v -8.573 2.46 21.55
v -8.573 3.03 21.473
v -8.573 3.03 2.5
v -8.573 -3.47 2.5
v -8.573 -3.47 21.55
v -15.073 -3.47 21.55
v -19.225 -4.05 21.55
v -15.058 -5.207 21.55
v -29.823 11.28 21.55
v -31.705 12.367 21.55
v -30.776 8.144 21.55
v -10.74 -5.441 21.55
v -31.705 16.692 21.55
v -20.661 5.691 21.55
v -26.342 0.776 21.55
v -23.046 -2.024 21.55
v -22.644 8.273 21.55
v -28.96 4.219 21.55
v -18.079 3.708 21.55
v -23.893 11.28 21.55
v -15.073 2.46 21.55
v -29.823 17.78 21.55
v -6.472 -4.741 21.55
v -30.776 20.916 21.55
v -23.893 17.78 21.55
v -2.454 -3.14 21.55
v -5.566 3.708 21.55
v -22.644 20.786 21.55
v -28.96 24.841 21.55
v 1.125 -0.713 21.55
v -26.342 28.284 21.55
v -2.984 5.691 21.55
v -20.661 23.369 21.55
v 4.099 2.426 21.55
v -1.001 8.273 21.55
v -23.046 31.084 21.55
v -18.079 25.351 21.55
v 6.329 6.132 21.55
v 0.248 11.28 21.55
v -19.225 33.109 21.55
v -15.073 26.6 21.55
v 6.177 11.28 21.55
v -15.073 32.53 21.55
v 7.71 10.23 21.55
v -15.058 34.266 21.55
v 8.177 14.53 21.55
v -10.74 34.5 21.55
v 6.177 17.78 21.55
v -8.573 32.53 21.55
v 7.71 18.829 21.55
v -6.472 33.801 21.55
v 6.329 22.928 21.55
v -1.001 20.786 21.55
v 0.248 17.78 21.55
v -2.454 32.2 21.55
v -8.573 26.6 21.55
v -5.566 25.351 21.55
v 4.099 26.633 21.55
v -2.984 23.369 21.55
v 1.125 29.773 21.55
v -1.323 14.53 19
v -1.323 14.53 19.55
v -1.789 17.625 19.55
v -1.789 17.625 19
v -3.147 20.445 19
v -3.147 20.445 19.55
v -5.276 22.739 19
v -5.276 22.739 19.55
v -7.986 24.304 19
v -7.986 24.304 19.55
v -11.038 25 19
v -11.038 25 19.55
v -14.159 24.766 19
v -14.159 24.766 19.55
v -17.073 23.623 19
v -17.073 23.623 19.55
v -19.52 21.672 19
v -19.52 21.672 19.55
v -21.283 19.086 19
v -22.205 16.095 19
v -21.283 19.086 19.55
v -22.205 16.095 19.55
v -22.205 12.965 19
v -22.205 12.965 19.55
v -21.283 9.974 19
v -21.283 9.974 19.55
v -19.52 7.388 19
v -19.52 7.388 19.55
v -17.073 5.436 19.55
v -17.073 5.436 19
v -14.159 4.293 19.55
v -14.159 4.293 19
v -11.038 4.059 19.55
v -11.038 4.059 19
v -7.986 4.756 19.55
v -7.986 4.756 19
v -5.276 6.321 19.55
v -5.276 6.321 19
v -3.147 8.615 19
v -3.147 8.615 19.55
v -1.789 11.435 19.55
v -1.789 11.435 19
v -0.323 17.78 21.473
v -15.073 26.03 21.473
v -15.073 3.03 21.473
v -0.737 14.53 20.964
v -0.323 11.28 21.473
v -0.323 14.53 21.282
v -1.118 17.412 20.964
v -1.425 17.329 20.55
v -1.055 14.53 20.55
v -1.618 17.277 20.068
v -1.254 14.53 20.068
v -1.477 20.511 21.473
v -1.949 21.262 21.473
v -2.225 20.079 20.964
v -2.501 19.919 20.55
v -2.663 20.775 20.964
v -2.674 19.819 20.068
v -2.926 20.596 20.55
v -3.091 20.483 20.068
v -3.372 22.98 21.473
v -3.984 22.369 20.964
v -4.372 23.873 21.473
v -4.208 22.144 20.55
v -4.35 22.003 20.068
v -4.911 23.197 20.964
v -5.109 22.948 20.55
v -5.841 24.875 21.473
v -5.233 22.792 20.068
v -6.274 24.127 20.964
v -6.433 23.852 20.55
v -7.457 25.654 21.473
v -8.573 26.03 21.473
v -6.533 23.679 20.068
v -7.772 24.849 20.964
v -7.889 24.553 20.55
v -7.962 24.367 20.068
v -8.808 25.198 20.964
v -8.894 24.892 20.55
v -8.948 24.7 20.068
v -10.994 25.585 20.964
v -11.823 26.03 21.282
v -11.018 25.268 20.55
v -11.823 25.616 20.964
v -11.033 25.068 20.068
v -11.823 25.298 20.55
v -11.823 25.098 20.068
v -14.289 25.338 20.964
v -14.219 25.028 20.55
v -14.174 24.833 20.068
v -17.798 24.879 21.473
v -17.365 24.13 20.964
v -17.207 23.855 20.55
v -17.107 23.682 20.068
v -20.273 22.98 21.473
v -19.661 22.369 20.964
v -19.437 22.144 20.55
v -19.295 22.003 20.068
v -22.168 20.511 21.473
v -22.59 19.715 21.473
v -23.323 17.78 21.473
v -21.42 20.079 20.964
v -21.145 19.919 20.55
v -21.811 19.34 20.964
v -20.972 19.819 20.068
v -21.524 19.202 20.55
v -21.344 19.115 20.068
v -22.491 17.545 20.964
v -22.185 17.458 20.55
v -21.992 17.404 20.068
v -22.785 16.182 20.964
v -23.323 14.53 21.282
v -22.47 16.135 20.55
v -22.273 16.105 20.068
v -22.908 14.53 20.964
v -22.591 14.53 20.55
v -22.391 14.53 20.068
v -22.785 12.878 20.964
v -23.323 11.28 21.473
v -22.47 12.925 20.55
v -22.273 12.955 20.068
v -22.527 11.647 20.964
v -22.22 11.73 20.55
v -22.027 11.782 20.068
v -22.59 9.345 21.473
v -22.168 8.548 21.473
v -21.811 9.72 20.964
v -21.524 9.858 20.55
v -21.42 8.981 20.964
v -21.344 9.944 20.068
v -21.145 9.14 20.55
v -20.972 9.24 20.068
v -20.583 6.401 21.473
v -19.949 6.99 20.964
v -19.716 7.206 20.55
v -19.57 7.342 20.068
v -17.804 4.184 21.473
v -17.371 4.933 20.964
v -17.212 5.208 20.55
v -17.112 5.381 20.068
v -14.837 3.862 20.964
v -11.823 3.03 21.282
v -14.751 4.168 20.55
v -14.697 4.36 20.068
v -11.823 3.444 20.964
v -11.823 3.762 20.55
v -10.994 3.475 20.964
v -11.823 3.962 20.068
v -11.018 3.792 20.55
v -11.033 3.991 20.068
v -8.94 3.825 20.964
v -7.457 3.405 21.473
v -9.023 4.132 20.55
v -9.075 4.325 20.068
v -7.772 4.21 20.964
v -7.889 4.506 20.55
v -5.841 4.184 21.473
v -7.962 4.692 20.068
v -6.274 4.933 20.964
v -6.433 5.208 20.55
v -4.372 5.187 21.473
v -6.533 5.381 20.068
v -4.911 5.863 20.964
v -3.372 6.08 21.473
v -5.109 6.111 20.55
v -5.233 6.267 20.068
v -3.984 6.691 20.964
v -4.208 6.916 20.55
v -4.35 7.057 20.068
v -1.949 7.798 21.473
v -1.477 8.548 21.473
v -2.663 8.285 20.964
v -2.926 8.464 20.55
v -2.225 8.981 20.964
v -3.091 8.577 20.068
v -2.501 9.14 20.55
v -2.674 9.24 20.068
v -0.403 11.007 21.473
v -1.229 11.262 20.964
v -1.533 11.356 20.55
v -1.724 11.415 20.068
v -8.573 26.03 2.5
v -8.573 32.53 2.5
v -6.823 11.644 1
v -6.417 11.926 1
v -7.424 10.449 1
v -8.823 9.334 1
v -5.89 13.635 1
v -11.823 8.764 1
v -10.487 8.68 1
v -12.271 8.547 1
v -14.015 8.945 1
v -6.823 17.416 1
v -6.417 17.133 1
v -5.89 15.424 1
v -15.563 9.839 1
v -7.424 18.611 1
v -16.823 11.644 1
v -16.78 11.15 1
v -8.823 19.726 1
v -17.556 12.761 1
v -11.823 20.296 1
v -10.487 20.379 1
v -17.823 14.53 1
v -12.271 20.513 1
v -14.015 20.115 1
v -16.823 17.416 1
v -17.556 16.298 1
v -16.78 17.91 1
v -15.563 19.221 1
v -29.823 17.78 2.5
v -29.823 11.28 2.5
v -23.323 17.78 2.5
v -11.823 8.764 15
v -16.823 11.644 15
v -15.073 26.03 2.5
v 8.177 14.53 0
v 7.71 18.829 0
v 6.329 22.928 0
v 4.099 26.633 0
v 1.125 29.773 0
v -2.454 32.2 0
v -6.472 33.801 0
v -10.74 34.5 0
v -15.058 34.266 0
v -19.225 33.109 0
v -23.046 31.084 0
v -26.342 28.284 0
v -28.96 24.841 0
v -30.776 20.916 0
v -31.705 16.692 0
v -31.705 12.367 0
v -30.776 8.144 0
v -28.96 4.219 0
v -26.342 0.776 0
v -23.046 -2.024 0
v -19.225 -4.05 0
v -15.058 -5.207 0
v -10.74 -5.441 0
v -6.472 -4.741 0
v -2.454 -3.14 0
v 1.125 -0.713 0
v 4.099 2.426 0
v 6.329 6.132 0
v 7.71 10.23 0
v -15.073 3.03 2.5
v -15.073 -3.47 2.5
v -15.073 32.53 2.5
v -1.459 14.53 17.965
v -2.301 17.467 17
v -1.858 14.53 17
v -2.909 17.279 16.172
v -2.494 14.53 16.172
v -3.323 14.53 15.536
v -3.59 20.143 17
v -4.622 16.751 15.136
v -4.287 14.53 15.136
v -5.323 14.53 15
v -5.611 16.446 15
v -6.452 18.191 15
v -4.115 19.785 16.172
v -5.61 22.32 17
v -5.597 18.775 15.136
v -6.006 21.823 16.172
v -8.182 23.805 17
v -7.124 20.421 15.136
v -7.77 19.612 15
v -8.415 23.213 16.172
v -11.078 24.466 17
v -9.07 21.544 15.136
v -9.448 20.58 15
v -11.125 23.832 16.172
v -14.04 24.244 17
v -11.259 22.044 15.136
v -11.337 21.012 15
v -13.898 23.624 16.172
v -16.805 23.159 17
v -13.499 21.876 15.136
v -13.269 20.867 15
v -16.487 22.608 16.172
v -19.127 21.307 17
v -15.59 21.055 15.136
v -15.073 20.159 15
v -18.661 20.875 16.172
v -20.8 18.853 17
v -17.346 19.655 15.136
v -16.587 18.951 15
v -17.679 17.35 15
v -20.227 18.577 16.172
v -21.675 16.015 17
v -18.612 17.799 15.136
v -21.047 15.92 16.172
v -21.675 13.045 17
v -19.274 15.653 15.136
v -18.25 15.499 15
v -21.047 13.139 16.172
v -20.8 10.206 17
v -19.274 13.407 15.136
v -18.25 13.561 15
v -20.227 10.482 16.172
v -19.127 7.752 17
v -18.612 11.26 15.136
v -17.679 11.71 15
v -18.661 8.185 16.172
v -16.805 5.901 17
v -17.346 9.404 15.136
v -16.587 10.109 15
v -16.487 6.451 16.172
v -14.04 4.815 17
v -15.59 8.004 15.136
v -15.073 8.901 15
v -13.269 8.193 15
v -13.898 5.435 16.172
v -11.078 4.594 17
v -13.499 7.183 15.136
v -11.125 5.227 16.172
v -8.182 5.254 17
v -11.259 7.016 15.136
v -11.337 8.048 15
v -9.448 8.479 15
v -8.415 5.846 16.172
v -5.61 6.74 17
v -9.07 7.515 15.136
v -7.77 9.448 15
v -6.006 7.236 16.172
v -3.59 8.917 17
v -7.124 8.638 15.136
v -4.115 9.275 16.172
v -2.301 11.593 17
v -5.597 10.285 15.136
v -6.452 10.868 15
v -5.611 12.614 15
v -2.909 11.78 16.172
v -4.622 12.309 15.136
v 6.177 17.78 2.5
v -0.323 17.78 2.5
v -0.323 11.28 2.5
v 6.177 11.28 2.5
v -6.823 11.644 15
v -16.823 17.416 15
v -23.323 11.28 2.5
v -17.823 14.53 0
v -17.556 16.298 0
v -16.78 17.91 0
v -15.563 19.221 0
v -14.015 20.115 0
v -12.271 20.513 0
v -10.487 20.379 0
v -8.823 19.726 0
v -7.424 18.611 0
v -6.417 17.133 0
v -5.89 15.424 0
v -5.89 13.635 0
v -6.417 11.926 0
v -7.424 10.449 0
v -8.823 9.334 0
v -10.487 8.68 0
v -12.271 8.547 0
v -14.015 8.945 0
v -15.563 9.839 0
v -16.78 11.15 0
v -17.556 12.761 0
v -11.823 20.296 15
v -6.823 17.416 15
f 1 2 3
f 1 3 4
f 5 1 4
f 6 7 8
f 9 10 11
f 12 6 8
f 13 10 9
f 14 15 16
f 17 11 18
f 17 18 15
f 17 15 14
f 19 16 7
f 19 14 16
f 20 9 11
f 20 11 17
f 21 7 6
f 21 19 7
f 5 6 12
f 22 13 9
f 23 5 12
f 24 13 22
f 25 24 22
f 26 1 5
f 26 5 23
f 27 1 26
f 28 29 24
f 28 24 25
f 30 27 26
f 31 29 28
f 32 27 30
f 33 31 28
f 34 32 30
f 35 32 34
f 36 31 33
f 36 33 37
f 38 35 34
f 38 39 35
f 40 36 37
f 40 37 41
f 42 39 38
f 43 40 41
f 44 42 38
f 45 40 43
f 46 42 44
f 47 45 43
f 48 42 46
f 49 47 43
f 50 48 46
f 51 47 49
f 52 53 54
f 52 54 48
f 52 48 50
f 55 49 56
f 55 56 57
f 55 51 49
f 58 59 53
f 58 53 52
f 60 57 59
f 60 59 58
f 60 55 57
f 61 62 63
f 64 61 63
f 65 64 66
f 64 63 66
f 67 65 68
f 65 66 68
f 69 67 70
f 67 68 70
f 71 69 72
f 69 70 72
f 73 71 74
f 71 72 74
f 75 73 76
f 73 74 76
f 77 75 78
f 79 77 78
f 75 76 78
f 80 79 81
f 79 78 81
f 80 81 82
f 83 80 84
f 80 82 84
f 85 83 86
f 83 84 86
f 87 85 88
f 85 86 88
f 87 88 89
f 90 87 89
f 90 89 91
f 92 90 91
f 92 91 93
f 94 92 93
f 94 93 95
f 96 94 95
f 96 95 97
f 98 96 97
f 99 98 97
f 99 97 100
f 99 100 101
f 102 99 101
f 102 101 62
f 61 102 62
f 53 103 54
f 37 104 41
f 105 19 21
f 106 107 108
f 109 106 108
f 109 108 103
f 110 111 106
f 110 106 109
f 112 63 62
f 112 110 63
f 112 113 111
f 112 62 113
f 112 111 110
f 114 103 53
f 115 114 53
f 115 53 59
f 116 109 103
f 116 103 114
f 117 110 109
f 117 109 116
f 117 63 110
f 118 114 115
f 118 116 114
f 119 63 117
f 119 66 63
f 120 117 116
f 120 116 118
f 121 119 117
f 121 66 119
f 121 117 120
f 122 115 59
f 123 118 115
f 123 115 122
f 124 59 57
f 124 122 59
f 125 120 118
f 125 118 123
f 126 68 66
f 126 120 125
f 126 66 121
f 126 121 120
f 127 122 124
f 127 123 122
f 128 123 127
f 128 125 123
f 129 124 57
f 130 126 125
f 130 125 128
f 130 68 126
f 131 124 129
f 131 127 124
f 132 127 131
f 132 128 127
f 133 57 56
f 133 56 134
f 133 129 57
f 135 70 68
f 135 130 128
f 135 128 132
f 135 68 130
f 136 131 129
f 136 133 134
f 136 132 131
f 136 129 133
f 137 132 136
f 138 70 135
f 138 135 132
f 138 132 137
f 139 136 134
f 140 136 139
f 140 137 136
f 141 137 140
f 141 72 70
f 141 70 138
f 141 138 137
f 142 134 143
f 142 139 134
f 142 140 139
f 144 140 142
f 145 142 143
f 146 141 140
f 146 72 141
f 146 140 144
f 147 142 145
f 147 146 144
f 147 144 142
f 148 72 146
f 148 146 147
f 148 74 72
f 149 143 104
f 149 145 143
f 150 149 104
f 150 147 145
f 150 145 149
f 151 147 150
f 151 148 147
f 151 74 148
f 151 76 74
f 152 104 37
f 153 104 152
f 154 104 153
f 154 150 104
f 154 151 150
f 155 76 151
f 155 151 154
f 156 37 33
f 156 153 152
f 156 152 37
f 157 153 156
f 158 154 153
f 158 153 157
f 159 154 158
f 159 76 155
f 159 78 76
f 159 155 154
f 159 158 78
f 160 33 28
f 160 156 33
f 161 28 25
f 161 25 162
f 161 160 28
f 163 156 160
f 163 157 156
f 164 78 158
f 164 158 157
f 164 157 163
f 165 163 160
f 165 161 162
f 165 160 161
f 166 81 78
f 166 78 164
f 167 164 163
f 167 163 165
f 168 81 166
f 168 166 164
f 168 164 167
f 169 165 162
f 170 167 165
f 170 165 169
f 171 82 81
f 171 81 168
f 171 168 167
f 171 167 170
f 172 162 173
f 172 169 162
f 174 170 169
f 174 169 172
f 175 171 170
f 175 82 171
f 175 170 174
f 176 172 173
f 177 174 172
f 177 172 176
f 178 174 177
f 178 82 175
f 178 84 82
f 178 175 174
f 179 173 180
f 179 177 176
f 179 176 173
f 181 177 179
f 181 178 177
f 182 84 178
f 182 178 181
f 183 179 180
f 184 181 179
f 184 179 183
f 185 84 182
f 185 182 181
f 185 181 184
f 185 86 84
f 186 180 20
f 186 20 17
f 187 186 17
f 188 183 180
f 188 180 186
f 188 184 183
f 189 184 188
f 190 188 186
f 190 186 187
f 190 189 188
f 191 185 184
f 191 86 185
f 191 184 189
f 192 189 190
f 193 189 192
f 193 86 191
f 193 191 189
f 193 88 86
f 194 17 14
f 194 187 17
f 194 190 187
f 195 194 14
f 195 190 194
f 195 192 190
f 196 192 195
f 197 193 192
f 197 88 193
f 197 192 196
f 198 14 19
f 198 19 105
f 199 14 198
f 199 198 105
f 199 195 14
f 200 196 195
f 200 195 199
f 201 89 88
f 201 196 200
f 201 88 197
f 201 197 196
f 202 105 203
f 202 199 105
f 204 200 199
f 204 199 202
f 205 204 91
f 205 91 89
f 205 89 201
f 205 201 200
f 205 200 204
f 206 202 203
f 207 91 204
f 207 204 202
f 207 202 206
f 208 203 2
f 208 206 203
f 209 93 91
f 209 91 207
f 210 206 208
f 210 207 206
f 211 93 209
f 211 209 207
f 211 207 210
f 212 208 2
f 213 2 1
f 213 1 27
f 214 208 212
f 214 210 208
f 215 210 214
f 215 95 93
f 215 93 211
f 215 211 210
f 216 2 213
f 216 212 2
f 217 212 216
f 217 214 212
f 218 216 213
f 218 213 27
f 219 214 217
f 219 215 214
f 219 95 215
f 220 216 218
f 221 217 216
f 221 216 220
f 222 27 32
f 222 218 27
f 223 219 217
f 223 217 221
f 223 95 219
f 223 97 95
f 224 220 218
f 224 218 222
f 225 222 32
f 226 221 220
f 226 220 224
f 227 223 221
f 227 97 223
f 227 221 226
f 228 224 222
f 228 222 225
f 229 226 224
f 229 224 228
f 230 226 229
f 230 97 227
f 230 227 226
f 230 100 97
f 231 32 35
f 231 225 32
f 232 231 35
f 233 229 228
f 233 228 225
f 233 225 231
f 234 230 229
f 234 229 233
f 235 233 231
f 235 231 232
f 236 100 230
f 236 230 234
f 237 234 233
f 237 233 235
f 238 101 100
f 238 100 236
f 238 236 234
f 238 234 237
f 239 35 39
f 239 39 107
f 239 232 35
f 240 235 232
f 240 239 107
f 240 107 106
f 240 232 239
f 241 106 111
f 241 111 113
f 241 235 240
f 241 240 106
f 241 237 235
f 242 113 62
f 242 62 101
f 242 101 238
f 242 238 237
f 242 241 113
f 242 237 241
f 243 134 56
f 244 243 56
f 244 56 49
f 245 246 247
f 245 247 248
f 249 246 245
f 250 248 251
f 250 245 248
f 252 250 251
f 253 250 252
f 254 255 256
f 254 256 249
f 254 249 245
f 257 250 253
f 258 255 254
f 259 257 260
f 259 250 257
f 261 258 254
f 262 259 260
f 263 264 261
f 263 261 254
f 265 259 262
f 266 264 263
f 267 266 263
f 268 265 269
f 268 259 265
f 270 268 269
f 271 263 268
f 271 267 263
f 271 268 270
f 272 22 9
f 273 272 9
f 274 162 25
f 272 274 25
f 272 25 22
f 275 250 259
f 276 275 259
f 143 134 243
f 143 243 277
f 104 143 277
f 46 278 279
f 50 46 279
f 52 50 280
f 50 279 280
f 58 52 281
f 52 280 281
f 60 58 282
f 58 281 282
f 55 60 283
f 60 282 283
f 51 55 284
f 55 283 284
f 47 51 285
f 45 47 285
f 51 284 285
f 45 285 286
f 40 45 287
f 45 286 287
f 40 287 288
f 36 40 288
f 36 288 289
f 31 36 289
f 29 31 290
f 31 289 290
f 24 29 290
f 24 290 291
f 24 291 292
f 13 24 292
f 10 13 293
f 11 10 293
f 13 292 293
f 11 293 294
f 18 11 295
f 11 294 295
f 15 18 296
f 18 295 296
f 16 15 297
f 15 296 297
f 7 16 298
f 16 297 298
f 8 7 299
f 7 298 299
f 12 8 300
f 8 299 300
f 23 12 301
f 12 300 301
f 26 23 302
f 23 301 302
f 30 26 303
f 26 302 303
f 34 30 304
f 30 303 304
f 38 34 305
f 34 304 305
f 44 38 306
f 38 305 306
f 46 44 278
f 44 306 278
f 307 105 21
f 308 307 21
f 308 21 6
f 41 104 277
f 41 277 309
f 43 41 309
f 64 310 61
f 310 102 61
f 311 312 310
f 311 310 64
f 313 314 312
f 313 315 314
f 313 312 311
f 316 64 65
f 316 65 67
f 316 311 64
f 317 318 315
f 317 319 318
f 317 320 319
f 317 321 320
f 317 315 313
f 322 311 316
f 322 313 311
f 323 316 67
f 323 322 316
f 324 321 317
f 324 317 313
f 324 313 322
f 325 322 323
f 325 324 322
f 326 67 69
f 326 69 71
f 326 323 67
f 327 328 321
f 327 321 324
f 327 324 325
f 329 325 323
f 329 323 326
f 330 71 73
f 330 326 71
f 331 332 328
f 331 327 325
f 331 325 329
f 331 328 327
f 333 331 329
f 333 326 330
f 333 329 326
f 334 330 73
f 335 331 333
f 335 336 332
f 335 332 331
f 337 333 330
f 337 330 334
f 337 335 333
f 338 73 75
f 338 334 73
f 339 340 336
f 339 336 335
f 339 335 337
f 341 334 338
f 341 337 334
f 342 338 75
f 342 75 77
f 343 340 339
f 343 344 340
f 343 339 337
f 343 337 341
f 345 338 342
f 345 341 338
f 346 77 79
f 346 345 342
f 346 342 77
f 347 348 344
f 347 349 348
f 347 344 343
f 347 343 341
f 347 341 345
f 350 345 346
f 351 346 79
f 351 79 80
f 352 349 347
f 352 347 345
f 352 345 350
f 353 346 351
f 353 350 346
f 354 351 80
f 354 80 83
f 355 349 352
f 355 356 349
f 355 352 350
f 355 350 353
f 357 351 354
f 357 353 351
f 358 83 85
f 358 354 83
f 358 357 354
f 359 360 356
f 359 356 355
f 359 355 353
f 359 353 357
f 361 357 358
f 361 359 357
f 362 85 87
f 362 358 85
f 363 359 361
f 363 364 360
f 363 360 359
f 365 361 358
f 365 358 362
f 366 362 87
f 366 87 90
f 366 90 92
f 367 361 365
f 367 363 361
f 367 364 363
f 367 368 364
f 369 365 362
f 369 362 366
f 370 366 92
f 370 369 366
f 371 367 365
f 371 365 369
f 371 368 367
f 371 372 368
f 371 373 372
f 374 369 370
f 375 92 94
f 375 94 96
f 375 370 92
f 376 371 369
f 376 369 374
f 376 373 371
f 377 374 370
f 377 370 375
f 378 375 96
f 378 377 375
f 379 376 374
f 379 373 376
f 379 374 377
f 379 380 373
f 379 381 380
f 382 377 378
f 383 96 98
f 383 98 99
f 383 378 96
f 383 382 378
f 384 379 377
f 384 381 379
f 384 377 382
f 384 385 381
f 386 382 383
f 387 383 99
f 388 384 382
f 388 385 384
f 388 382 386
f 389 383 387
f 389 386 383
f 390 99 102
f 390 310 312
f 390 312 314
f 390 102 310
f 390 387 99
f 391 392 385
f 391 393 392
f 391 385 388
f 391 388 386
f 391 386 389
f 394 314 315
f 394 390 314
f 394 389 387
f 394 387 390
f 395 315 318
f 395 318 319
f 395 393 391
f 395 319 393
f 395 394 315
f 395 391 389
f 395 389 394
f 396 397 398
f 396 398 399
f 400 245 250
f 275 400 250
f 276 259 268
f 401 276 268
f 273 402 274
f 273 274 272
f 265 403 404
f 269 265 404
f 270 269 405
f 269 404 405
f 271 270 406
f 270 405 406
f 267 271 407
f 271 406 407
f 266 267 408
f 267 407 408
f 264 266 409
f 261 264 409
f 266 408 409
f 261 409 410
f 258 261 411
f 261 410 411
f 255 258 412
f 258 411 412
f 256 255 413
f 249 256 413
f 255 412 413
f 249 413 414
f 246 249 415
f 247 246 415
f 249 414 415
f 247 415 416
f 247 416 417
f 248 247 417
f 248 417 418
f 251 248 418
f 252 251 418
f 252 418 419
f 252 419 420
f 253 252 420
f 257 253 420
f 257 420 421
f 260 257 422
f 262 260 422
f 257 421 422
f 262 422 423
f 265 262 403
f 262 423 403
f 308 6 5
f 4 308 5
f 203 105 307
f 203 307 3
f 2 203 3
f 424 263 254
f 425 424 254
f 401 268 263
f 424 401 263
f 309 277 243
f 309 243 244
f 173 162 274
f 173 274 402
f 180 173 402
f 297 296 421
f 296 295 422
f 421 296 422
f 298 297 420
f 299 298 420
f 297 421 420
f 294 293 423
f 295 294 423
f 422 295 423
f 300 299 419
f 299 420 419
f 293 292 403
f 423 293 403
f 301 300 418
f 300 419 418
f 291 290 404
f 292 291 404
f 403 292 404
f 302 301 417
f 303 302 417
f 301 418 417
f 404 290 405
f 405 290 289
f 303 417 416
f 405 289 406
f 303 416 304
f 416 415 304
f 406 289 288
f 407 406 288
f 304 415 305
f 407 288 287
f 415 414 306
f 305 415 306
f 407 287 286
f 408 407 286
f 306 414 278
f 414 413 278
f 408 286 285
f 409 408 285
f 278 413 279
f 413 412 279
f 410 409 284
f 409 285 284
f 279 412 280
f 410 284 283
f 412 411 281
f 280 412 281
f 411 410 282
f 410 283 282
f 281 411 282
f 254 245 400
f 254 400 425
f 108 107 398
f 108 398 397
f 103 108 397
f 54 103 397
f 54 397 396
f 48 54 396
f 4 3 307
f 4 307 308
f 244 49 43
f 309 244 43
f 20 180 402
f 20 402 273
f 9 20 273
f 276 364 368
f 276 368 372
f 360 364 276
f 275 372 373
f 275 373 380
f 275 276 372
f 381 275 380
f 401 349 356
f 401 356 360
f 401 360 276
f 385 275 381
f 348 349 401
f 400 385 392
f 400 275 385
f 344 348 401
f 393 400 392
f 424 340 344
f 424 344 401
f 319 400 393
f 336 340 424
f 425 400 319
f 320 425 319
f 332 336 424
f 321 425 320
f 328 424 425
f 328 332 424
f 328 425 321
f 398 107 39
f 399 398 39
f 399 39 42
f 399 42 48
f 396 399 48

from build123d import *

# Parameters (mm, degrees)
SKETCH1_R                       = 20
SKETCH1_R_2                     = 1
BOSS_EXTRUDE1_DEPTH             = 21.55
TAP_DRILL_FOR_M5X0_8_TAP1_D     = 4.2
TAP_DRILL_FOR_M5X0_8_TAP1_DEPTH = 5
TAP_DRILL_FOR_M5X0_8_TAP1_TIP   = 1.2618073
SKETCH4_W                       = 6.5
SKETCH4_H                       = 6.5
CUT_EXTRUDE1_DEPTH              = 19.05
CIRPATTERN1_COUNT               = 4
SKETCH5_R                       = 6
SKETCH5_R_2                     = 5
SKETCH5_R_3                     = 1
CUT_EXTRUDE2_DEPTH              = 1
CUT_EXTRUDE3_START              = -21.55
SKETCH6_W                       = 10
SKETCH6_H                       = 5.7725
SKETCH6_R                       = 2.1
CUT_EXTRUDE3_DEPTH              = 21.55
SKETCH7_R                       = 10.5
CUT_EXTRUDE4_DEPTH              = 6.55
FILLET4_R                       = 2
FILLET5_R                       = 4


with BuildPart() as part:
    # Sketch1 → Boss-Extrude1 (new body)
    with BuildSketch(Plane.XY):
        with Locations((-11.822558412, 14.529752947)):
            Circle(SKETCH1_R)
        with Locations((-11.822558412, 14.529752947)):
            Circle(SKETCH1_R_2, mode=Mode.SUBTRACT)
    extrude(amount=BOSS_EXTRUDE1_DEPTH)

    # Tap Drill for M5x0.8 Tap1
    with Locations(Plane.XY.offset(21.55)):
        with Locations((-11.822558412, 14.529752947)):
            Hole(TAP_DRILL_FOR_M5X0_8_TAP1_D / 2, depth=TAP_DRILL_FOR_M5X0_8_TAP1_DEPTH)
            with Locations((0, 0, -(TAP_DRILL_FOR_M5X0_8_TAP1_DEPTH + TAP_DRILL_FOR_M5X0_8_TAP1_TIP / 2))):  # 118° drill point
                Cone(0, TAP_DRILL_FOR_M5X0_8_TAP1_D / 2, TAP_DRILL_FOR_M5X0_8_TAP1_TIP, mode=Mode.SUBTRACT)

    # Sketch4 → Cut-Extrude1 (cut)
    with BuildSketch(Plane.XY.offset(21.55)):
        with Locations((2.927441588, 14.529752947)):
            Rectangle(SKETCH4_W, SKETCH4_H)
    cut_extrude1 = extrude(amount=-CUT_EXTRUDE1_DEPTH, mode=Mode.SUBTRACT)

    # CirPattern1: Cut-Extrude1 ×4 about axis
    cirpattern1_axis = Axis((-11.822558412, 14.529752947, 0), (0, 0, 1))
    for i in range(1, CIRPATTERN1_COUNT):
        add(cut_extrude1.rotate(cirpattern1_axis, i * 360 / CIRPATTERN1_COUNT), mode=Mode.SUBTRACT)

    # Sketch5 → Cut-Extrude2 (cut)
    # profile 1 of 2: a face of its own
    with BuildSketch(Plane(origin=(0, 0, 0), x_dir=(-1, 0, 0), z_dir=(0, 0, -1))):
        with Locations((11.822558412, 14.529752947)):
            Circle(SKETCH5_R)
        with Locations((11.822558412, 14.529752947)):
            Circle(SKETCH5_R_2, mode=Mode.SUBTRACT)
    # profile 2 of 2: a face of its own
    with BuildSketch(Plane(origin=(0, 0, 0), x_dir=(-1, 0, 0), z_dir=(0, 0, -1))):
        with Locations((11.822558412, 14.529752947)):
            Circle(SKETCH5_R_2)
        with Locations((11.822558412, 14.529752947)):
            Circle(SKETCH5_R_3, mode=Mode.SUBTRACT)
    extrude(amount=-CUT_EXTRUDE2_DEPTH, mode=Mode.SUBTRACT)

    # Sketch6 → Cut-Extrude3 (cut)
    # profile 1 of 4: a face of its own
    with BuildSketch(Plane.XY.offset(21.55).offset(CUT_EXTRUDE3_START)):
        with Locations((-11.822558412, 14.529752947)):
            Rectangle(SKETCH6_W, SKETCH6_H)
        with Locations((-11.822558412, 14.529752947)):
            Circle(SKETCH6_R, mode=Mode.SUBTRACT)
    # profile 2 of 4: a face of its own
    with BuildSketch(Plane.XY.offset(21.55).offset(CUT_EXTRUDE3_START)):
        with Locations((-11.822558412, 14.529752947)):
            Circle(SKETCH6_R)
    # profile 3 of 4: a face of its own
    with BuildSketch(Plane.XY.offset(21.55).offset(CUT_EXTRUDE3_START)):
        Polygon((-11.822558412, 20.295742519), (-6.822558412, 17.416002947), (-16.822558412, 17.416002947), align=None)
    # profile 4 of 4: a face of its own
    with BuildSketch(Plane.XY.offset(21.55).offset(CUT_EXTRUDE3_START)):
        Polygon((-11.822558412, 8.763763375), (-16.822558412, 11.643502947), (-6.822558412, 11.643502947), align=None)
    extrude(amount=CUT_EXTRUDE3_DEPTH, mode=Mode.SUBTRACT)

    # Sketch7 → Cut-Extrude4 (cut)
    with BuildSketch(Plane.XY.offset(21.55)):
        with Locations((-11.822558412, 14.529752947)):
            Circle(SKETCH7_R)
    extrude(amount=-CUT_EXTRUDE4_DEPTH, mode=Mode.SUBTRACT)

    # Fillet4
    # the kernel refuses this fillet: 2 mm, written as the material it takes off along each edge
    with BuildSketch(Plane(origin=(-11.822558412, 14.529752947, 21.55), x_dir=(1, 0, 0), z_dir=(0, -1, 0))) as fillet4_piece_1:
        with BuildLine():
            CenterArc((10.5 + FILLET4_R, -FILLET4_R), FILLET4_R, 90, 90)
            Line((10.5, -FILLET4_R), (10.5, 0))
            Line((10.5, 0), (10.5 + FILLET4_R, 0))
        make_face()
    revolve(axis=Axis((-11.822558412, 14.529752947, 21.55), (0, 0, 1)), mode=Mode.SUBTRACT)

    # Fillet5
    fillet5_edges = [part.edges().sort_by_distance(p)[0] for p in [
        (-22.322558412, 14.529752947, 15),
    ]]
    fillet(fillet5_edges, radius=FILLET5_R)


solid = part.part
